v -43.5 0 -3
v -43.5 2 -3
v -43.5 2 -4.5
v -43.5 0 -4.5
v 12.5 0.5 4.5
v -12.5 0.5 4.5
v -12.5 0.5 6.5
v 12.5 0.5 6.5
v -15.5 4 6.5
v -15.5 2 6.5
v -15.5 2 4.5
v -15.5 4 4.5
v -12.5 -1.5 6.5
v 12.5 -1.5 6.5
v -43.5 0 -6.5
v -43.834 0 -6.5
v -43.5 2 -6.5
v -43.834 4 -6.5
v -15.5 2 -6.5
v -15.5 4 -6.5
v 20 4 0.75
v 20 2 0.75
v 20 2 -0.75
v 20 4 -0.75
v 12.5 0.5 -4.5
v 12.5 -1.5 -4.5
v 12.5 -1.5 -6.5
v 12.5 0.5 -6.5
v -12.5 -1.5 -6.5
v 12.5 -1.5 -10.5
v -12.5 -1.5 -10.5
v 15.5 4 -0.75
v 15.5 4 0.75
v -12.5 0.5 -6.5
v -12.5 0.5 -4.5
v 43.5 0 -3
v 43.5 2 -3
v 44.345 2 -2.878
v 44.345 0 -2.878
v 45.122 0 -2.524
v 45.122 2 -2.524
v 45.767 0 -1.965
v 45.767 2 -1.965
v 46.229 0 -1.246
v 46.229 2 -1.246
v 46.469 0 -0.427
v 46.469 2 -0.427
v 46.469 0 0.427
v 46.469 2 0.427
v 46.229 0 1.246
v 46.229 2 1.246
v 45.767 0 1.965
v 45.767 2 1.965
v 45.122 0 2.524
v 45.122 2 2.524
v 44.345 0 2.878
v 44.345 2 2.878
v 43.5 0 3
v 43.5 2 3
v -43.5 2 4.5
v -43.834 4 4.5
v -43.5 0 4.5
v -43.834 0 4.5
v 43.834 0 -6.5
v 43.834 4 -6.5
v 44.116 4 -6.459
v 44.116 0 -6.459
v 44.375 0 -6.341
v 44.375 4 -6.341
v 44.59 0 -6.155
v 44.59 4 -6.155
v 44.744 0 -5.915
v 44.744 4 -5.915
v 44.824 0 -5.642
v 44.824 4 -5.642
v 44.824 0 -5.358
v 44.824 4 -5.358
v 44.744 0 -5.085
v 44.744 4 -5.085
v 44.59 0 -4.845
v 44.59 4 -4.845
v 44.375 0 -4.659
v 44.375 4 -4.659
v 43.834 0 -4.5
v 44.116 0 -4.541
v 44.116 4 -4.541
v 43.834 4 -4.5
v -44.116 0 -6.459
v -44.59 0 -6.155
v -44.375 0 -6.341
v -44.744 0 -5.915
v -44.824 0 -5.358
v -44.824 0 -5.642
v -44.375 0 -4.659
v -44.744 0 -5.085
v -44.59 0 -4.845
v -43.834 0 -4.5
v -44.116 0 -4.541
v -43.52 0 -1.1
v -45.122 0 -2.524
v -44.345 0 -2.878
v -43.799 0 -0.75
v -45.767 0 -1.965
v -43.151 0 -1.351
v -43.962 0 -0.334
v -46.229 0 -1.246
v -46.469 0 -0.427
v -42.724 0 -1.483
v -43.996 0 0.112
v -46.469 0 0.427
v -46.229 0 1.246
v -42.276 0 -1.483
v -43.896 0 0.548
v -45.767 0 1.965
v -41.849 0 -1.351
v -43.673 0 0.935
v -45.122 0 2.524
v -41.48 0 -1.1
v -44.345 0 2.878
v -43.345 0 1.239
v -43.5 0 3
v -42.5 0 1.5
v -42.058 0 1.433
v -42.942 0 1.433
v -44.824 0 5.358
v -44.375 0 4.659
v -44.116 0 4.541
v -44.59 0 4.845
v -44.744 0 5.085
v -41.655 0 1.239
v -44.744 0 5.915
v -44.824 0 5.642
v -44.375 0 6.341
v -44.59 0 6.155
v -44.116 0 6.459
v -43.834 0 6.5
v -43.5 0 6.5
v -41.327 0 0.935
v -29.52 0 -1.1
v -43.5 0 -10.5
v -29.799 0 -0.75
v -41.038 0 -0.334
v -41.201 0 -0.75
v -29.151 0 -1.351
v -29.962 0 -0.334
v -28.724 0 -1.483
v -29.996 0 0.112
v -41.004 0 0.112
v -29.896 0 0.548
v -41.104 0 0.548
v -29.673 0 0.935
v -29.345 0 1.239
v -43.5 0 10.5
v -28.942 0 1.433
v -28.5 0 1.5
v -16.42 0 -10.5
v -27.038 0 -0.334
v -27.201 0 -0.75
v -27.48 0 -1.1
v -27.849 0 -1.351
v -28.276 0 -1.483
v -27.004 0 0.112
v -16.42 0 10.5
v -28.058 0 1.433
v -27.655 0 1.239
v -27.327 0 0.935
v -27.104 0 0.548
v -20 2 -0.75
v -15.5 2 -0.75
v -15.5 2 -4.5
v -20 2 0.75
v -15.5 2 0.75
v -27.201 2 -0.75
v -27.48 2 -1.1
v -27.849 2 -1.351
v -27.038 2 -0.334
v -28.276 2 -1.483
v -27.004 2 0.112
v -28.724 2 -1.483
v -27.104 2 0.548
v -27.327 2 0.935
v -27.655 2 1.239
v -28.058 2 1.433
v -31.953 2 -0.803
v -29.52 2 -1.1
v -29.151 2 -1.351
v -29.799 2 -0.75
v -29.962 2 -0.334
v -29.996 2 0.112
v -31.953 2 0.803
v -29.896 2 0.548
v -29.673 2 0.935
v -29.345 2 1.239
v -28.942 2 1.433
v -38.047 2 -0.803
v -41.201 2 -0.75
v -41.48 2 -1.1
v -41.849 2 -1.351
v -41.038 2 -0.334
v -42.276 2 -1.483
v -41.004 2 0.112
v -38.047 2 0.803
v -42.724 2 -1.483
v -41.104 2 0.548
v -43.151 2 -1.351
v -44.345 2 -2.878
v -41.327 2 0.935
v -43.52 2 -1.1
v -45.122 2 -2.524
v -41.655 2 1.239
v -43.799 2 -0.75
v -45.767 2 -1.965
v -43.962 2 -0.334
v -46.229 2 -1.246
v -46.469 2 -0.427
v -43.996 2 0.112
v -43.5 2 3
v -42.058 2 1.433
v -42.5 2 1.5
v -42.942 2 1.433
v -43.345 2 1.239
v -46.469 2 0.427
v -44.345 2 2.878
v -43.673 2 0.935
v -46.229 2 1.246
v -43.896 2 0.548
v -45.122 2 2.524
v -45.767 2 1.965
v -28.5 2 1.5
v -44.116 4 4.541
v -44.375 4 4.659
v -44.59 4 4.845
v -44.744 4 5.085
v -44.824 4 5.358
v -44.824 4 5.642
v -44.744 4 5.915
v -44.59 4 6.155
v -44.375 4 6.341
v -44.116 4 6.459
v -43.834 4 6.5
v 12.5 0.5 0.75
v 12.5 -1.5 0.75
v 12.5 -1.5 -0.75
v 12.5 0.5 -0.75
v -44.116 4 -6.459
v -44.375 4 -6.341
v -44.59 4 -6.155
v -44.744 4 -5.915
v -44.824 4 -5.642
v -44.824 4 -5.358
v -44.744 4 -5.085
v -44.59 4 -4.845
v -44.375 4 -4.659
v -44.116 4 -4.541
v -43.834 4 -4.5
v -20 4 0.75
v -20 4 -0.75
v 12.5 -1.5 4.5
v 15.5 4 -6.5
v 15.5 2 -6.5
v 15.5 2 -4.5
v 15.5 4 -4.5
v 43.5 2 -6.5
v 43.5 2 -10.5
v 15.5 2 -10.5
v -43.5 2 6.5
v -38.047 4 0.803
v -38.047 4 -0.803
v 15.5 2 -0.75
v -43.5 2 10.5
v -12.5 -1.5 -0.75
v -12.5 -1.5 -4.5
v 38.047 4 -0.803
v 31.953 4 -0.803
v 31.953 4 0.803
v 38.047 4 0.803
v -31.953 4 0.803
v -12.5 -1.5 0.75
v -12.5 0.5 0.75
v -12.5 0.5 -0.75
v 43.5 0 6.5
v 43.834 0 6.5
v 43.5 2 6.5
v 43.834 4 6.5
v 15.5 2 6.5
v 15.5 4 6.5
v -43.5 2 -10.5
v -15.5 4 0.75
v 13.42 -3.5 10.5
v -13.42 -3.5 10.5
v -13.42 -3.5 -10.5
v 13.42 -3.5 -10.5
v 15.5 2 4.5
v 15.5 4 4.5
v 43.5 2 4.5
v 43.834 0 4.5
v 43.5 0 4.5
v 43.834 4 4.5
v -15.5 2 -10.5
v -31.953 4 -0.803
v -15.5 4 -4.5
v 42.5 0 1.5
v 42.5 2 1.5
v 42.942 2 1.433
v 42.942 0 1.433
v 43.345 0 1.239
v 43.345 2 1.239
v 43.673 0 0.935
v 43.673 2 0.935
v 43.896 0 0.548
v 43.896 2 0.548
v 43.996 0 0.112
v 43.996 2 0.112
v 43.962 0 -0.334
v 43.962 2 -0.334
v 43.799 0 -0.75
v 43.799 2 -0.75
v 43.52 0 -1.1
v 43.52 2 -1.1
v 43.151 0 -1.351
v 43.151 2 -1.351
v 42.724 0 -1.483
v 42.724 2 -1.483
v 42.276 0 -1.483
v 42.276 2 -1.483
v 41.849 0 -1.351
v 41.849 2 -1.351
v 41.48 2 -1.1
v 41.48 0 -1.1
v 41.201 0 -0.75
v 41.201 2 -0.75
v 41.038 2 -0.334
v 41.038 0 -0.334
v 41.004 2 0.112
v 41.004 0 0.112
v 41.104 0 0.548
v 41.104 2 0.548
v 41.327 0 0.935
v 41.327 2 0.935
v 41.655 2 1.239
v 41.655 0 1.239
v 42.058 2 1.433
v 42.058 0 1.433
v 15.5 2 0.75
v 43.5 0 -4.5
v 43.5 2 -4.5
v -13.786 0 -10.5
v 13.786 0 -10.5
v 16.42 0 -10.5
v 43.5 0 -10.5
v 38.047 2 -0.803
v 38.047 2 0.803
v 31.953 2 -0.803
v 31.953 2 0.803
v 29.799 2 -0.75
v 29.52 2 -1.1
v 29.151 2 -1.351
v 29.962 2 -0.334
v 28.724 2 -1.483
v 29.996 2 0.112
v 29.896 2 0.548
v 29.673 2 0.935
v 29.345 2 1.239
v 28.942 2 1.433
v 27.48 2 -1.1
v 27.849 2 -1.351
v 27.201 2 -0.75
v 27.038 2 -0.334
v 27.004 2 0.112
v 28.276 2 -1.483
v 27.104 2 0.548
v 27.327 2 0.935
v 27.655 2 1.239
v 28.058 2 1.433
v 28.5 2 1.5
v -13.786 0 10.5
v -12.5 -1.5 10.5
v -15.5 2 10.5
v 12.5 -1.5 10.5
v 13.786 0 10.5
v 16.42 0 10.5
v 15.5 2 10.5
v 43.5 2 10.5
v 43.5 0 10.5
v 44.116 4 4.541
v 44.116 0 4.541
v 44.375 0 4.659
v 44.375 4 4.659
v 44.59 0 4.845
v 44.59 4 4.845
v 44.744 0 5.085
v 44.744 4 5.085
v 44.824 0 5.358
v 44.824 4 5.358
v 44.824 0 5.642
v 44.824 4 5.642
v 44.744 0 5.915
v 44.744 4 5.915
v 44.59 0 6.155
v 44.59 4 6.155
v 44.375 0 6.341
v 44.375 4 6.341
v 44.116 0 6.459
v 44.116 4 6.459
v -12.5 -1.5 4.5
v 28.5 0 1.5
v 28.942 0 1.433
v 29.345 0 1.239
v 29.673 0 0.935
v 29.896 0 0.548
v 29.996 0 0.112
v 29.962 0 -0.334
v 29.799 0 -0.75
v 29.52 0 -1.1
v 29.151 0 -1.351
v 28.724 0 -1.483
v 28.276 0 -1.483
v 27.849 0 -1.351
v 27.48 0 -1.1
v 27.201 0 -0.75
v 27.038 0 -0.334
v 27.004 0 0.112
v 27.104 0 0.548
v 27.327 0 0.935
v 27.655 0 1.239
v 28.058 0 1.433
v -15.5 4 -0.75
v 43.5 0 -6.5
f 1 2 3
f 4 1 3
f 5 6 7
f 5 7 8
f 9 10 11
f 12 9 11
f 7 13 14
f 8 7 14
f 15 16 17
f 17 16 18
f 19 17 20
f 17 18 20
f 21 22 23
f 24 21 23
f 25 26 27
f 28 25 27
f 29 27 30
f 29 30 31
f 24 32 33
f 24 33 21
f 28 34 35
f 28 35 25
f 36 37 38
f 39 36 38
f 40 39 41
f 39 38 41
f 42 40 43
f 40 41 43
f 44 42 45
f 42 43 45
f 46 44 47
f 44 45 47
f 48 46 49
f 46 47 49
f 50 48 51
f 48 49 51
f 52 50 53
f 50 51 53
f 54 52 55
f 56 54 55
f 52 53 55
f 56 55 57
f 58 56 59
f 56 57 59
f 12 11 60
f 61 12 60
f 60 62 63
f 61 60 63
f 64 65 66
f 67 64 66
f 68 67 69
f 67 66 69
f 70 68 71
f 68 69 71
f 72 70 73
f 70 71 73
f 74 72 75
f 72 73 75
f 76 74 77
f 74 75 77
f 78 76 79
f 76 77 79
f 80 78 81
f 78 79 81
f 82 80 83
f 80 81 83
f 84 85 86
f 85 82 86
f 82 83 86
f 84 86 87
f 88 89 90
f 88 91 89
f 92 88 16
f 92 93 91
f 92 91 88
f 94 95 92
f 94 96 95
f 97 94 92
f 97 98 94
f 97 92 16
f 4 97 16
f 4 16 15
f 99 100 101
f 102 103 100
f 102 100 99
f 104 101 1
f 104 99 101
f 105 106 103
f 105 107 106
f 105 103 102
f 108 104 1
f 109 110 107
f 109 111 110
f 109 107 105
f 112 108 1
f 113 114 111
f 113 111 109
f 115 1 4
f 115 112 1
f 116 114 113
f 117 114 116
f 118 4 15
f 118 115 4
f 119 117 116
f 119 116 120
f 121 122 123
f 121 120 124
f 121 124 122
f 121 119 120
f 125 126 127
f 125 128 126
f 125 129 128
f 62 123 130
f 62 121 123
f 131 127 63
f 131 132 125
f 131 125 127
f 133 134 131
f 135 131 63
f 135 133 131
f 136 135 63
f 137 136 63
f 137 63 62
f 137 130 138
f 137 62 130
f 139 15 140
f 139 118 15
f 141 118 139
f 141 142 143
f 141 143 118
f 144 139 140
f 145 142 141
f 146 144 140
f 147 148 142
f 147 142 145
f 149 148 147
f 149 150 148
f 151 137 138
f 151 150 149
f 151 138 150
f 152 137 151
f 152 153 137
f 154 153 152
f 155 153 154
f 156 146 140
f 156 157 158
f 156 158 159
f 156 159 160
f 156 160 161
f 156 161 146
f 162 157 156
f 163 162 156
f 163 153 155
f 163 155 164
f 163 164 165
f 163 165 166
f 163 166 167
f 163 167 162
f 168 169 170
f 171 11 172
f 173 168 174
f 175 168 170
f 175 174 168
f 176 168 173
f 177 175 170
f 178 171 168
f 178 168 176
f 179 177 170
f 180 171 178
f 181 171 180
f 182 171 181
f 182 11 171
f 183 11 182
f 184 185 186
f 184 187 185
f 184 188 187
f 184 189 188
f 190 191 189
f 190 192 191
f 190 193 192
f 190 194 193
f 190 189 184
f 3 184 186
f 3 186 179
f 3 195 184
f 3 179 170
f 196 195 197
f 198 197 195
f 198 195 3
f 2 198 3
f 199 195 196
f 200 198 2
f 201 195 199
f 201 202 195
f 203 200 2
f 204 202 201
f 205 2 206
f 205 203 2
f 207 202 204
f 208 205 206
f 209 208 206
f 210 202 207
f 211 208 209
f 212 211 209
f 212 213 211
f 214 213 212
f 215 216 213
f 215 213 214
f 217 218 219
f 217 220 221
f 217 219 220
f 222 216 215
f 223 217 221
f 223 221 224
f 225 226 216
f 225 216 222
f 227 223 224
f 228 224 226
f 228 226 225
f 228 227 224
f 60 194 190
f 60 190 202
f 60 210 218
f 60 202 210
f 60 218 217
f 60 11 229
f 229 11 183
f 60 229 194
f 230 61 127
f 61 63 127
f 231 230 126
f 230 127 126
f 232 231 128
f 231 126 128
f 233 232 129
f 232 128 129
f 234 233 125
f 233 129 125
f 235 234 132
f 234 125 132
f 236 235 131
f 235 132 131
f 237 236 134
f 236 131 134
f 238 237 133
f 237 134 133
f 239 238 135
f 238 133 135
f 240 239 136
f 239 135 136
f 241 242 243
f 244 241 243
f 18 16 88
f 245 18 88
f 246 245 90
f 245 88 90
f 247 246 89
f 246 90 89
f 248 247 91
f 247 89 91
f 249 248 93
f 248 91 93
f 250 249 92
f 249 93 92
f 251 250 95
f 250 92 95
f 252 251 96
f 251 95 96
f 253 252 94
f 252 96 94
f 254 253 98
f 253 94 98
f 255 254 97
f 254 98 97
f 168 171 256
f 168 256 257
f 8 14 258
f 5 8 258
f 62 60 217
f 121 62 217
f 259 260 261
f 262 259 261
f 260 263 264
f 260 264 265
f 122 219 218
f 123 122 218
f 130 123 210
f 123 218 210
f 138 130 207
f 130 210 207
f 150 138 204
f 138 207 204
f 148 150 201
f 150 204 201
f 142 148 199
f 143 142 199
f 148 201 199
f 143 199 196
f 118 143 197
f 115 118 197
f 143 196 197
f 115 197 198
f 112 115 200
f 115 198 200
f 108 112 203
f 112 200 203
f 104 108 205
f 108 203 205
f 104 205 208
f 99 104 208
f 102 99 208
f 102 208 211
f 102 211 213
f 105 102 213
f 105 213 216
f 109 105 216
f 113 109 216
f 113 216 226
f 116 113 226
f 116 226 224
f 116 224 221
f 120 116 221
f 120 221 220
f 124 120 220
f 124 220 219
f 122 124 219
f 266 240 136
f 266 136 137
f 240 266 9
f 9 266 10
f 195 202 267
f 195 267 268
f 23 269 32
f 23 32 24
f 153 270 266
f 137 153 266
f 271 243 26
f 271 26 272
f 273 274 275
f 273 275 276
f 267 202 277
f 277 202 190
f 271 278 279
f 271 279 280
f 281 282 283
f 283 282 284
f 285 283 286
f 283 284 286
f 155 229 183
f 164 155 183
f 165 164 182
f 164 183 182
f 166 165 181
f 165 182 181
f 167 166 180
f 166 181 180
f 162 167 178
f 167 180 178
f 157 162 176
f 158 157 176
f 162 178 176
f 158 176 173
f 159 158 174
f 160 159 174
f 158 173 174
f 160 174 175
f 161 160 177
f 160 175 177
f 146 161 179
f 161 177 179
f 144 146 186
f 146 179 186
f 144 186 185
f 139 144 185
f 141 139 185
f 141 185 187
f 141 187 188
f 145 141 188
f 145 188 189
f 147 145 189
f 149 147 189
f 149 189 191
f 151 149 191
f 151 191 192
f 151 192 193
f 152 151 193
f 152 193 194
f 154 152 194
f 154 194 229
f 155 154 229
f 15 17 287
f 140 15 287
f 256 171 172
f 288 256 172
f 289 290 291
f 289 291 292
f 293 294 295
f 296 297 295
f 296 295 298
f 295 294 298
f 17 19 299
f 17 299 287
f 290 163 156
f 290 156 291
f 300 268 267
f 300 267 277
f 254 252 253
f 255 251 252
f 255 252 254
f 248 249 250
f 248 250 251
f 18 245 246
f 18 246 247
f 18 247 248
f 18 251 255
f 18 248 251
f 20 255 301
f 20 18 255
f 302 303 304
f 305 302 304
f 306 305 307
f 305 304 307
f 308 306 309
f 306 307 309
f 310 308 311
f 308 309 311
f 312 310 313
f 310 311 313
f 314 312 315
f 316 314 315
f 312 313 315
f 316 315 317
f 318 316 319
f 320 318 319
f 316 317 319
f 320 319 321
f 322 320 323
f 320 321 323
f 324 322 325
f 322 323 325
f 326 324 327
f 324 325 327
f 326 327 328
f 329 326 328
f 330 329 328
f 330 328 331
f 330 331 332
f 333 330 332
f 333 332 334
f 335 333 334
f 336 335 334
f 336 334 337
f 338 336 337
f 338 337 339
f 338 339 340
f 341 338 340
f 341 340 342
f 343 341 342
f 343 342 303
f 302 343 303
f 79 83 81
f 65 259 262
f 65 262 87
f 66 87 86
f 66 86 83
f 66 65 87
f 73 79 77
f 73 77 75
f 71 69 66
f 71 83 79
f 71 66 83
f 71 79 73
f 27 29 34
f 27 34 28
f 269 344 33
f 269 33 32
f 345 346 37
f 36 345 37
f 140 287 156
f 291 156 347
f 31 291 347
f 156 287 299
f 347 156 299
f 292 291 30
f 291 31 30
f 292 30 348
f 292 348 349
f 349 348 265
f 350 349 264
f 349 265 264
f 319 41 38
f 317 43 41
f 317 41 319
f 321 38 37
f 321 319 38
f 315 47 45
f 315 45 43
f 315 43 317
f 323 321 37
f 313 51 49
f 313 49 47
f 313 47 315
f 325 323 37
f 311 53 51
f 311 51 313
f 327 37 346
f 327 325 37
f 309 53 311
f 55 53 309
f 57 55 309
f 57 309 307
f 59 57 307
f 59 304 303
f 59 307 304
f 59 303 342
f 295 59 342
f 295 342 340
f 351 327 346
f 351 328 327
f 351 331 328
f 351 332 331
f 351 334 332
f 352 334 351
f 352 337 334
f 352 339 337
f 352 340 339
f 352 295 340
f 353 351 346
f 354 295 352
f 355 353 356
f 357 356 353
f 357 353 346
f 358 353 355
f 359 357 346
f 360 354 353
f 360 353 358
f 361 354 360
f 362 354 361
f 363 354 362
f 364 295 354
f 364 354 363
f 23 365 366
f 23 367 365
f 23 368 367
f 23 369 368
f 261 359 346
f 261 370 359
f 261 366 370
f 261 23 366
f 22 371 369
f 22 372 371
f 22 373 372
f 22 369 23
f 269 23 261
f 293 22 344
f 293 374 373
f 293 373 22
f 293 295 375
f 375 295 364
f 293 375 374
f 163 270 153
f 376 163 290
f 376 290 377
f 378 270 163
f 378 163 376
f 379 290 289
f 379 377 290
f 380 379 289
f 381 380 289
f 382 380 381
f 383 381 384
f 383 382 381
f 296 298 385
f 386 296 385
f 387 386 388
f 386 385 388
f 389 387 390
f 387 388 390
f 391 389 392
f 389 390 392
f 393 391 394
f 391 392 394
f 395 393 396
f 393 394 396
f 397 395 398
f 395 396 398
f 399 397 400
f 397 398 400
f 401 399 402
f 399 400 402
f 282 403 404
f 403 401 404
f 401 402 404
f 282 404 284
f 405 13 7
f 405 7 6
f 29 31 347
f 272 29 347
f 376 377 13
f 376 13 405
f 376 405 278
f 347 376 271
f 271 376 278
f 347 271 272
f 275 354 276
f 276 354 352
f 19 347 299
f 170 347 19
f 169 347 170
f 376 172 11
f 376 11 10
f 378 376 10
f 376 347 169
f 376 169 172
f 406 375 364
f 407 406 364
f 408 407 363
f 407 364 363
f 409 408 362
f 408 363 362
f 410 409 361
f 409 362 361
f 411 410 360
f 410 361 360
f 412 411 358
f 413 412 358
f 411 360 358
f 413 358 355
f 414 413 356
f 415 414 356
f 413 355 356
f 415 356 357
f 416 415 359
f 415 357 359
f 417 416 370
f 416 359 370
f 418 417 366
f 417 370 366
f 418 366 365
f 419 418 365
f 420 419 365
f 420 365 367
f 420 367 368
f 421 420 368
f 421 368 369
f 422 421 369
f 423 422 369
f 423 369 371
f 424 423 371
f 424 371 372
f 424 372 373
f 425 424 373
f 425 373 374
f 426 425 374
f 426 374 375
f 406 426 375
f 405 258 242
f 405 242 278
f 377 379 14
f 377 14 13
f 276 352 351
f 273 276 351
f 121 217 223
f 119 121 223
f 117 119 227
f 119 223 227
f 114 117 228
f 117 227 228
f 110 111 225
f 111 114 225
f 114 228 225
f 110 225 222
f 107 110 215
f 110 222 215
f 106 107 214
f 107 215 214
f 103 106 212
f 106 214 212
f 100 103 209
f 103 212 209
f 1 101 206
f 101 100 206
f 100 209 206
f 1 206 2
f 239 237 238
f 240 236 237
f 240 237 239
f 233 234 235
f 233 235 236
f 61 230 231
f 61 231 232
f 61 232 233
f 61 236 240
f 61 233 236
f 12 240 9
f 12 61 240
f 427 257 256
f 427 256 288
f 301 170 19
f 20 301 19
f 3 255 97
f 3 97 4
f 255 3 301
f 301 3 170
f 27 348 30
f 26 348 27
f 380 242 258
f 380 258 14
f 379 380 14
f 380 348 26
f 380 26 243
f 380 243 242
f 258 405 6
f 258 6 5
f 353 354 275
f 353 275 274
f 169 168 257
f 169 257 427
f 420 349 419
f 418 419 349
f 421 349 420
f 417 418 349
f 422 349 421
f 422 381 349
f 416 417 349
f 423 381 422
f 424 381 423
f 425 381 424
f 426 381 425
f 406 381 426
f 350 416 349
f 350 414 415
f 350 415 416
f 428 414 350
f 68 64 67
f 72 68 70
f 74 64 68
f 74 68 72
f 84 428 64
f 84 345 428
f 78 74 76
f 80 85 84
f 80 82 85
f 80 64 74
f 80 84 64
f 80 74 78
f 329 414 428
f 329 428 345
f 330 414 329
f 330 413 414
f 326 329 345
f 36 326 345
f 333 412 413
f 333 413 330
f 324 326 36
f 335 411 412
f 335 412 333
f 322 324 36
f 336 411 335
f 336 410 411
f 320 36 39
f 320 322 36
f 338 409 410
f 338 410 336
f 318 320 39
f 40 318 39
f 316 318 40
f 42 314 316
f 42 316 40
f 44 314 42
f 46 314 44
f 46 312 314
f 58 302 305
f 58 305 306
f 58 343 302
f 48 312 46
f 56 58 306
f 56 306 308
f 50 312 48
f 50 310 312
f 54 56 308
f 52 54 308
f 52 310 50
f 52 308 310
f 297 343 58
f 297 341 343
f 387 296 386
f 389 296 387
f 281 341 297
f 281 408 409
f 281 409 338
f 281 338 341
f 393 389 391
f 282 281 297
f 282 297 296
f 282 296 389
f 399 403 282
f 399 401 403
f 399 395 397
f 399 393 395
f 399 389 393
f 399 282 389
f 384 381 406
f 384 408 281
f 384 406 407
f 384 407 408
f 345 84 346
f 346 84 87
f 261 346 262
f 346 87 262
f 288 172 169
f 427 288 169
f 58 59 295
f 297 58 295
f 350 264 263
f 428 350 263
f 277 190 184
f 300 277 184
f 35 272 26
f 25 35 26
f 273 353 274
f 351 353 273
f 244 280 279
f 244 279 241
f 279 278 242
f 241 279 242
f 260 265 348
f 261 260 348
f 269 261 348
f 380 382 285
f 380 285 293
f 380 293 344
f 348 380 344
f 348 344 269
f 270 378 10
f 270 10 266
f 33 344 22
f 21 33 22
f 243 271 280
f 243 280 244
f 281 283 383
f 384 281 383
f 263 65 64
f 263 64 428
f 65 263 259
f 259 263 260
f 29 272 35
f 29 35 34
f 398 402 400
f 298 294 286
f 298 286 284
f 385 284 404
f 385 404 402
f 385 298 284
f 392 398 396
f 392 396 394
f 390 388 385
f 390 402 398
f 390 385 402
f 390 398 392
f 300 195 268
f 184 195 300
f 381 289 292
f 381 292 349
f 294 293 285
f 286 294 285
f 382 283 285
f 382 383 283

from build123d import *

# Parameters (mm, degrees)
SALIENTE_EXTRUIR1_DEPTH = 10.5
CORTAR_EXTRUIR1_DEPTH   = 48.9869774
ENVOLVER1_OUTLINE_W     = 4.5
ENVOLVER1_OUTLINE_H     = 1.5
ENVOLVER1_OUTLINE_W_2   = 6.094706288
ENVOLVER1_OUTLINE_H_2   = 1.606152826
ENVOLVER1_DEPTH         = 2
ENVOLVER1_START         = -3.5
ENVOLVER1_2_OUTLINE_W   = 25
ENVOLVER1_2_OUTLINE_H   = 2
ENVOLVER1_2_OUTLINE_H_2 = 1.5
ENVOLVER1_2_DEPTH       = 2
CROQUIS5_R              = 1.5
CORTAR_EXTRUIR2_DEPTH   = 48.9869774


# Read off the part's stored shape, not the designer's step: Envolver1
with BuildPart() as part:
    # Croquis1 → Saliente-Extruir1 (new, symmetric)
    with BuildSketch(Plane.XY):
        Polygon((-46.5, 2), (-46.5, 0), (-16.419869845, 0), (-13.785714286, 0), (-15.5, 2), align=None)
        Polygon((-13.785714286, 0), (-16.419869845, 0), (-13.419869845, -3.5), (13.419869845, -3.5), (16.419869845, 0), (13.785714286, 0), (12.5, -1.5), (-12.5, -1.5), align=None)
        Polygon((15.5, 2), (13.785714286, 0), (16.419869845, 0), (46.5, 0), (46.5, 2), align=None)
    extrude(amount=SALIENTE_EXTRUIR1_DEPTH, both=True)

    # Croquis3 → Cortar-Extruir1 (cut, through all)
    with BuildSketch(Plane(origin=(0, 2, 0), x_dir=(1, 0, 0), z_dir=(0, 1, 0))):
        with BuildLine():
            Line((-43.833986837, -4.5), (-43.5, -4.5))
            Line((-43.5, -4.5), (-43.5, -3))
            ThreePointArc((-43.5, -3), (-46.5, 0), (-43.5, 3))
            Line((-43.5, 3), (-43.5, 4.5))
            Line((-43.5, 4.5), (-43.833986837, 4.5))
            ThreePointArc((-43.833986837, 4.5), (-44.833986837, 5.5), (-43.833986837, 6.5))
            Line((-43.833986837, 6.5), (-43.5, 6.5))
            Line((-43.5, 6.5), (-43.5, 10.5))
            Line((-43.5, 10.5), (-43.5, 12.222660865))
            Line((-43.5, 12.222660865), (-52.324213339, 12.222660865))
            Line((-52.324213339, 12.222660865), (-52.324213339, -12.147175549))
            Line((-52.324213339, -12.147175549), (-43.5, -12.147175549))
            Line((-43.5, -12.147175549), (-43.5, -10.5))
            Line((-43.5, -10.5), (-43.5, -6.5))
            Line((-43.5, -6.5), (-43.833986837, -6.5))
            ThreePointArc((-43.833986837, -6.5), (-44.833986837, -5.5), (-43.833986837, -4.5))
        make_face()
        with BuildLine():
            Line((43.5, 12.222660865), (43.5, 10.5))
            Line((43.5, 10.5), (43.5, 6.5))
            Line((43.5, 6.5), (43.833986837, 6.5))
            ThreePointArc((43.833986837, 6.5), (44.833986837, 5.5), (43.833986837, 4.5))
            Line((43.833986837, 4.5), (43.5, 4.5))
            Line((43.5, 4.5), (43.5, 3))
            ThreePointArc((43.5, 3), (46.5, 0), (43.5, -3))
            Line((43.5, -3), (43.5, -4.5))
            Line((43.5, -4.5), (43.833986837, -4.5))
            ThreePointArc((43.833986837, -4.5), (44.833986837, -5.5), (43.833986837, -6.5))
            Line((43.833986837, -6.5), (43.5, -6.5))
            Line((43.5, -6.5), (43.5, -10.5))
            Line((43.5, -10.5), (43.5, -12.147175549))
            Line((43.5, -12.147175549), (52.324213339, -12.147175549))
            Line((52.324213339, -12.147175549), (52.324213339, 12.222660865))
            Line((52.324213339, 12.222660865), (43.5, 12.222660865))
        make_face()
    extrude(amount=-CORTAR_EXTRUIR1_DEPTH, mode=Mode.SUBTRACT)

    # Envolver1 outline → Envolver1 (add)
    with BuildSketch(Plane(origin=(0, 2, 0), x_dir=(1, 0, 0), z_dir=(0, 1, 0))):
        with BuildLine():
            Line((-15.5, -4.5), (-43.833986837, -4.5))
            ThreePointArc((-43.833986837, -4.5), (-44.833986837, -5.5), (-43.833986837, -6.5))
            Line((-43.833986837, -6.5), (-15.5, -6.5))
            Line((-15.5, -6.5), (-15.5, -4.5))
        make_face()
        with BuildLine():
            Line((43.833986837, -4.5), (15.5, -4.5))
            Line((15.5, -4.5), (15.5, -6.5))
            Line((15.5, -6.5), (43.833986837, -6.5))
            ThreePointArc((43.833986837, -6.5), (44.833986837, -5.5), (43.833986837, -4.5))
        make_face()
        with BuildLine():
            Line((-15.5, 6.5), (-43.833986837, 6.5))
            ThreePointArc((-43.833986837, 6.5), (-44.833986837, 5.5), (-43.833986837, 4.5))
            Line((-43.833986837, 4.5), (-15.5, 4.5))
            Line((-15.5, 4.5), (-15.5, 6.5))
        make_face()
        with BuildLine():
            Line((43.833986837, 6.5), (15.5, 6.5))
            Line((15.5, 6.5), (15.5, 4.5))
            Line((15.5, 4.5), (43.833986837, 4.5))
            ThreePointArc((43.833986837, 4.5), (44.833986837, 5.5), (43.833986837, 6.5))
        make_face()
        with Locations((17.75, 0)):
            Rectangle(ENVOLVER1_OUTLINE_W, ENVOLVER1_OUTLINE_H)
        with Locations((-17.75, 0)):
            Rectangle(ENVOLVER1_OUTLINE_W, ENVOLVER1_OUTLINE_H)
        with Locations((35, 0)):
            Rectangle(ENVOLVER1_OUTLINE_W_2, ENVOLVER1_OUTLINE_H_2)
        with Locations((-35, 0)):
            Rectangle(ENVOLVER1_OUTLINE_W_2, ENVOLVER1_OUTLINE_H_2)
    extrude(amount=ENVOLVER1_DEPTH)

    # Envolver1 2 outline → Envolver1 2 (add)
    with BuildSketch(Plane(origin=(0, 2, 0), x_dir=(1, 0, 0), z_dir=(0, 1, 0)).offset(ENVOLVER1_START)):
        with Locations((0, -5.5)):
            Rectangle(ENVOLVER1_2_OUTLINE_W, ENVOLVER1_2_OUTLINE_H)
        with Locations((0, 5.5)):
            Rectangle(ENVOLVER1_2_OUTLINE_W, ENVOLVER1_2_OUTLINE_H)
        Rectangle(ENVOLVER1_2_OUTLINE_W, ENVOLVER1_2_OUTLINE_H_2)
    extrude(amount=ENVOLVER1_2_DEPTH)

    # Croquis5 → Cortar-Extruir2 (cut, through all)
    with BuildSketch(Plane(origin=(0, 2, 0), x_dir=(1, 0, 0), z_dir=(0, 1, 0))):
        with Locations(Location((-42.5, 0, 0), (0, 0, 270))):
            Circle(CROQUIS5_R)
        with Locations(Location((42.5, 0, 0), (0, 0, 270))):
            Circle(CROQUIS5_R)
        with Locations(Location((28.5, 0, 0), (0, 0, 270))):
            Circle(CROQUIS5_R)
        with Locations(Location((-28.5, 0, 0), (0, 0, 270))):
            Circle(CROQUIS5_R)
    extrude(amount=-CORTAR_EXTRUIR2_DEPTH, mode=Mode.SUBTRACT)


solid = part.part
